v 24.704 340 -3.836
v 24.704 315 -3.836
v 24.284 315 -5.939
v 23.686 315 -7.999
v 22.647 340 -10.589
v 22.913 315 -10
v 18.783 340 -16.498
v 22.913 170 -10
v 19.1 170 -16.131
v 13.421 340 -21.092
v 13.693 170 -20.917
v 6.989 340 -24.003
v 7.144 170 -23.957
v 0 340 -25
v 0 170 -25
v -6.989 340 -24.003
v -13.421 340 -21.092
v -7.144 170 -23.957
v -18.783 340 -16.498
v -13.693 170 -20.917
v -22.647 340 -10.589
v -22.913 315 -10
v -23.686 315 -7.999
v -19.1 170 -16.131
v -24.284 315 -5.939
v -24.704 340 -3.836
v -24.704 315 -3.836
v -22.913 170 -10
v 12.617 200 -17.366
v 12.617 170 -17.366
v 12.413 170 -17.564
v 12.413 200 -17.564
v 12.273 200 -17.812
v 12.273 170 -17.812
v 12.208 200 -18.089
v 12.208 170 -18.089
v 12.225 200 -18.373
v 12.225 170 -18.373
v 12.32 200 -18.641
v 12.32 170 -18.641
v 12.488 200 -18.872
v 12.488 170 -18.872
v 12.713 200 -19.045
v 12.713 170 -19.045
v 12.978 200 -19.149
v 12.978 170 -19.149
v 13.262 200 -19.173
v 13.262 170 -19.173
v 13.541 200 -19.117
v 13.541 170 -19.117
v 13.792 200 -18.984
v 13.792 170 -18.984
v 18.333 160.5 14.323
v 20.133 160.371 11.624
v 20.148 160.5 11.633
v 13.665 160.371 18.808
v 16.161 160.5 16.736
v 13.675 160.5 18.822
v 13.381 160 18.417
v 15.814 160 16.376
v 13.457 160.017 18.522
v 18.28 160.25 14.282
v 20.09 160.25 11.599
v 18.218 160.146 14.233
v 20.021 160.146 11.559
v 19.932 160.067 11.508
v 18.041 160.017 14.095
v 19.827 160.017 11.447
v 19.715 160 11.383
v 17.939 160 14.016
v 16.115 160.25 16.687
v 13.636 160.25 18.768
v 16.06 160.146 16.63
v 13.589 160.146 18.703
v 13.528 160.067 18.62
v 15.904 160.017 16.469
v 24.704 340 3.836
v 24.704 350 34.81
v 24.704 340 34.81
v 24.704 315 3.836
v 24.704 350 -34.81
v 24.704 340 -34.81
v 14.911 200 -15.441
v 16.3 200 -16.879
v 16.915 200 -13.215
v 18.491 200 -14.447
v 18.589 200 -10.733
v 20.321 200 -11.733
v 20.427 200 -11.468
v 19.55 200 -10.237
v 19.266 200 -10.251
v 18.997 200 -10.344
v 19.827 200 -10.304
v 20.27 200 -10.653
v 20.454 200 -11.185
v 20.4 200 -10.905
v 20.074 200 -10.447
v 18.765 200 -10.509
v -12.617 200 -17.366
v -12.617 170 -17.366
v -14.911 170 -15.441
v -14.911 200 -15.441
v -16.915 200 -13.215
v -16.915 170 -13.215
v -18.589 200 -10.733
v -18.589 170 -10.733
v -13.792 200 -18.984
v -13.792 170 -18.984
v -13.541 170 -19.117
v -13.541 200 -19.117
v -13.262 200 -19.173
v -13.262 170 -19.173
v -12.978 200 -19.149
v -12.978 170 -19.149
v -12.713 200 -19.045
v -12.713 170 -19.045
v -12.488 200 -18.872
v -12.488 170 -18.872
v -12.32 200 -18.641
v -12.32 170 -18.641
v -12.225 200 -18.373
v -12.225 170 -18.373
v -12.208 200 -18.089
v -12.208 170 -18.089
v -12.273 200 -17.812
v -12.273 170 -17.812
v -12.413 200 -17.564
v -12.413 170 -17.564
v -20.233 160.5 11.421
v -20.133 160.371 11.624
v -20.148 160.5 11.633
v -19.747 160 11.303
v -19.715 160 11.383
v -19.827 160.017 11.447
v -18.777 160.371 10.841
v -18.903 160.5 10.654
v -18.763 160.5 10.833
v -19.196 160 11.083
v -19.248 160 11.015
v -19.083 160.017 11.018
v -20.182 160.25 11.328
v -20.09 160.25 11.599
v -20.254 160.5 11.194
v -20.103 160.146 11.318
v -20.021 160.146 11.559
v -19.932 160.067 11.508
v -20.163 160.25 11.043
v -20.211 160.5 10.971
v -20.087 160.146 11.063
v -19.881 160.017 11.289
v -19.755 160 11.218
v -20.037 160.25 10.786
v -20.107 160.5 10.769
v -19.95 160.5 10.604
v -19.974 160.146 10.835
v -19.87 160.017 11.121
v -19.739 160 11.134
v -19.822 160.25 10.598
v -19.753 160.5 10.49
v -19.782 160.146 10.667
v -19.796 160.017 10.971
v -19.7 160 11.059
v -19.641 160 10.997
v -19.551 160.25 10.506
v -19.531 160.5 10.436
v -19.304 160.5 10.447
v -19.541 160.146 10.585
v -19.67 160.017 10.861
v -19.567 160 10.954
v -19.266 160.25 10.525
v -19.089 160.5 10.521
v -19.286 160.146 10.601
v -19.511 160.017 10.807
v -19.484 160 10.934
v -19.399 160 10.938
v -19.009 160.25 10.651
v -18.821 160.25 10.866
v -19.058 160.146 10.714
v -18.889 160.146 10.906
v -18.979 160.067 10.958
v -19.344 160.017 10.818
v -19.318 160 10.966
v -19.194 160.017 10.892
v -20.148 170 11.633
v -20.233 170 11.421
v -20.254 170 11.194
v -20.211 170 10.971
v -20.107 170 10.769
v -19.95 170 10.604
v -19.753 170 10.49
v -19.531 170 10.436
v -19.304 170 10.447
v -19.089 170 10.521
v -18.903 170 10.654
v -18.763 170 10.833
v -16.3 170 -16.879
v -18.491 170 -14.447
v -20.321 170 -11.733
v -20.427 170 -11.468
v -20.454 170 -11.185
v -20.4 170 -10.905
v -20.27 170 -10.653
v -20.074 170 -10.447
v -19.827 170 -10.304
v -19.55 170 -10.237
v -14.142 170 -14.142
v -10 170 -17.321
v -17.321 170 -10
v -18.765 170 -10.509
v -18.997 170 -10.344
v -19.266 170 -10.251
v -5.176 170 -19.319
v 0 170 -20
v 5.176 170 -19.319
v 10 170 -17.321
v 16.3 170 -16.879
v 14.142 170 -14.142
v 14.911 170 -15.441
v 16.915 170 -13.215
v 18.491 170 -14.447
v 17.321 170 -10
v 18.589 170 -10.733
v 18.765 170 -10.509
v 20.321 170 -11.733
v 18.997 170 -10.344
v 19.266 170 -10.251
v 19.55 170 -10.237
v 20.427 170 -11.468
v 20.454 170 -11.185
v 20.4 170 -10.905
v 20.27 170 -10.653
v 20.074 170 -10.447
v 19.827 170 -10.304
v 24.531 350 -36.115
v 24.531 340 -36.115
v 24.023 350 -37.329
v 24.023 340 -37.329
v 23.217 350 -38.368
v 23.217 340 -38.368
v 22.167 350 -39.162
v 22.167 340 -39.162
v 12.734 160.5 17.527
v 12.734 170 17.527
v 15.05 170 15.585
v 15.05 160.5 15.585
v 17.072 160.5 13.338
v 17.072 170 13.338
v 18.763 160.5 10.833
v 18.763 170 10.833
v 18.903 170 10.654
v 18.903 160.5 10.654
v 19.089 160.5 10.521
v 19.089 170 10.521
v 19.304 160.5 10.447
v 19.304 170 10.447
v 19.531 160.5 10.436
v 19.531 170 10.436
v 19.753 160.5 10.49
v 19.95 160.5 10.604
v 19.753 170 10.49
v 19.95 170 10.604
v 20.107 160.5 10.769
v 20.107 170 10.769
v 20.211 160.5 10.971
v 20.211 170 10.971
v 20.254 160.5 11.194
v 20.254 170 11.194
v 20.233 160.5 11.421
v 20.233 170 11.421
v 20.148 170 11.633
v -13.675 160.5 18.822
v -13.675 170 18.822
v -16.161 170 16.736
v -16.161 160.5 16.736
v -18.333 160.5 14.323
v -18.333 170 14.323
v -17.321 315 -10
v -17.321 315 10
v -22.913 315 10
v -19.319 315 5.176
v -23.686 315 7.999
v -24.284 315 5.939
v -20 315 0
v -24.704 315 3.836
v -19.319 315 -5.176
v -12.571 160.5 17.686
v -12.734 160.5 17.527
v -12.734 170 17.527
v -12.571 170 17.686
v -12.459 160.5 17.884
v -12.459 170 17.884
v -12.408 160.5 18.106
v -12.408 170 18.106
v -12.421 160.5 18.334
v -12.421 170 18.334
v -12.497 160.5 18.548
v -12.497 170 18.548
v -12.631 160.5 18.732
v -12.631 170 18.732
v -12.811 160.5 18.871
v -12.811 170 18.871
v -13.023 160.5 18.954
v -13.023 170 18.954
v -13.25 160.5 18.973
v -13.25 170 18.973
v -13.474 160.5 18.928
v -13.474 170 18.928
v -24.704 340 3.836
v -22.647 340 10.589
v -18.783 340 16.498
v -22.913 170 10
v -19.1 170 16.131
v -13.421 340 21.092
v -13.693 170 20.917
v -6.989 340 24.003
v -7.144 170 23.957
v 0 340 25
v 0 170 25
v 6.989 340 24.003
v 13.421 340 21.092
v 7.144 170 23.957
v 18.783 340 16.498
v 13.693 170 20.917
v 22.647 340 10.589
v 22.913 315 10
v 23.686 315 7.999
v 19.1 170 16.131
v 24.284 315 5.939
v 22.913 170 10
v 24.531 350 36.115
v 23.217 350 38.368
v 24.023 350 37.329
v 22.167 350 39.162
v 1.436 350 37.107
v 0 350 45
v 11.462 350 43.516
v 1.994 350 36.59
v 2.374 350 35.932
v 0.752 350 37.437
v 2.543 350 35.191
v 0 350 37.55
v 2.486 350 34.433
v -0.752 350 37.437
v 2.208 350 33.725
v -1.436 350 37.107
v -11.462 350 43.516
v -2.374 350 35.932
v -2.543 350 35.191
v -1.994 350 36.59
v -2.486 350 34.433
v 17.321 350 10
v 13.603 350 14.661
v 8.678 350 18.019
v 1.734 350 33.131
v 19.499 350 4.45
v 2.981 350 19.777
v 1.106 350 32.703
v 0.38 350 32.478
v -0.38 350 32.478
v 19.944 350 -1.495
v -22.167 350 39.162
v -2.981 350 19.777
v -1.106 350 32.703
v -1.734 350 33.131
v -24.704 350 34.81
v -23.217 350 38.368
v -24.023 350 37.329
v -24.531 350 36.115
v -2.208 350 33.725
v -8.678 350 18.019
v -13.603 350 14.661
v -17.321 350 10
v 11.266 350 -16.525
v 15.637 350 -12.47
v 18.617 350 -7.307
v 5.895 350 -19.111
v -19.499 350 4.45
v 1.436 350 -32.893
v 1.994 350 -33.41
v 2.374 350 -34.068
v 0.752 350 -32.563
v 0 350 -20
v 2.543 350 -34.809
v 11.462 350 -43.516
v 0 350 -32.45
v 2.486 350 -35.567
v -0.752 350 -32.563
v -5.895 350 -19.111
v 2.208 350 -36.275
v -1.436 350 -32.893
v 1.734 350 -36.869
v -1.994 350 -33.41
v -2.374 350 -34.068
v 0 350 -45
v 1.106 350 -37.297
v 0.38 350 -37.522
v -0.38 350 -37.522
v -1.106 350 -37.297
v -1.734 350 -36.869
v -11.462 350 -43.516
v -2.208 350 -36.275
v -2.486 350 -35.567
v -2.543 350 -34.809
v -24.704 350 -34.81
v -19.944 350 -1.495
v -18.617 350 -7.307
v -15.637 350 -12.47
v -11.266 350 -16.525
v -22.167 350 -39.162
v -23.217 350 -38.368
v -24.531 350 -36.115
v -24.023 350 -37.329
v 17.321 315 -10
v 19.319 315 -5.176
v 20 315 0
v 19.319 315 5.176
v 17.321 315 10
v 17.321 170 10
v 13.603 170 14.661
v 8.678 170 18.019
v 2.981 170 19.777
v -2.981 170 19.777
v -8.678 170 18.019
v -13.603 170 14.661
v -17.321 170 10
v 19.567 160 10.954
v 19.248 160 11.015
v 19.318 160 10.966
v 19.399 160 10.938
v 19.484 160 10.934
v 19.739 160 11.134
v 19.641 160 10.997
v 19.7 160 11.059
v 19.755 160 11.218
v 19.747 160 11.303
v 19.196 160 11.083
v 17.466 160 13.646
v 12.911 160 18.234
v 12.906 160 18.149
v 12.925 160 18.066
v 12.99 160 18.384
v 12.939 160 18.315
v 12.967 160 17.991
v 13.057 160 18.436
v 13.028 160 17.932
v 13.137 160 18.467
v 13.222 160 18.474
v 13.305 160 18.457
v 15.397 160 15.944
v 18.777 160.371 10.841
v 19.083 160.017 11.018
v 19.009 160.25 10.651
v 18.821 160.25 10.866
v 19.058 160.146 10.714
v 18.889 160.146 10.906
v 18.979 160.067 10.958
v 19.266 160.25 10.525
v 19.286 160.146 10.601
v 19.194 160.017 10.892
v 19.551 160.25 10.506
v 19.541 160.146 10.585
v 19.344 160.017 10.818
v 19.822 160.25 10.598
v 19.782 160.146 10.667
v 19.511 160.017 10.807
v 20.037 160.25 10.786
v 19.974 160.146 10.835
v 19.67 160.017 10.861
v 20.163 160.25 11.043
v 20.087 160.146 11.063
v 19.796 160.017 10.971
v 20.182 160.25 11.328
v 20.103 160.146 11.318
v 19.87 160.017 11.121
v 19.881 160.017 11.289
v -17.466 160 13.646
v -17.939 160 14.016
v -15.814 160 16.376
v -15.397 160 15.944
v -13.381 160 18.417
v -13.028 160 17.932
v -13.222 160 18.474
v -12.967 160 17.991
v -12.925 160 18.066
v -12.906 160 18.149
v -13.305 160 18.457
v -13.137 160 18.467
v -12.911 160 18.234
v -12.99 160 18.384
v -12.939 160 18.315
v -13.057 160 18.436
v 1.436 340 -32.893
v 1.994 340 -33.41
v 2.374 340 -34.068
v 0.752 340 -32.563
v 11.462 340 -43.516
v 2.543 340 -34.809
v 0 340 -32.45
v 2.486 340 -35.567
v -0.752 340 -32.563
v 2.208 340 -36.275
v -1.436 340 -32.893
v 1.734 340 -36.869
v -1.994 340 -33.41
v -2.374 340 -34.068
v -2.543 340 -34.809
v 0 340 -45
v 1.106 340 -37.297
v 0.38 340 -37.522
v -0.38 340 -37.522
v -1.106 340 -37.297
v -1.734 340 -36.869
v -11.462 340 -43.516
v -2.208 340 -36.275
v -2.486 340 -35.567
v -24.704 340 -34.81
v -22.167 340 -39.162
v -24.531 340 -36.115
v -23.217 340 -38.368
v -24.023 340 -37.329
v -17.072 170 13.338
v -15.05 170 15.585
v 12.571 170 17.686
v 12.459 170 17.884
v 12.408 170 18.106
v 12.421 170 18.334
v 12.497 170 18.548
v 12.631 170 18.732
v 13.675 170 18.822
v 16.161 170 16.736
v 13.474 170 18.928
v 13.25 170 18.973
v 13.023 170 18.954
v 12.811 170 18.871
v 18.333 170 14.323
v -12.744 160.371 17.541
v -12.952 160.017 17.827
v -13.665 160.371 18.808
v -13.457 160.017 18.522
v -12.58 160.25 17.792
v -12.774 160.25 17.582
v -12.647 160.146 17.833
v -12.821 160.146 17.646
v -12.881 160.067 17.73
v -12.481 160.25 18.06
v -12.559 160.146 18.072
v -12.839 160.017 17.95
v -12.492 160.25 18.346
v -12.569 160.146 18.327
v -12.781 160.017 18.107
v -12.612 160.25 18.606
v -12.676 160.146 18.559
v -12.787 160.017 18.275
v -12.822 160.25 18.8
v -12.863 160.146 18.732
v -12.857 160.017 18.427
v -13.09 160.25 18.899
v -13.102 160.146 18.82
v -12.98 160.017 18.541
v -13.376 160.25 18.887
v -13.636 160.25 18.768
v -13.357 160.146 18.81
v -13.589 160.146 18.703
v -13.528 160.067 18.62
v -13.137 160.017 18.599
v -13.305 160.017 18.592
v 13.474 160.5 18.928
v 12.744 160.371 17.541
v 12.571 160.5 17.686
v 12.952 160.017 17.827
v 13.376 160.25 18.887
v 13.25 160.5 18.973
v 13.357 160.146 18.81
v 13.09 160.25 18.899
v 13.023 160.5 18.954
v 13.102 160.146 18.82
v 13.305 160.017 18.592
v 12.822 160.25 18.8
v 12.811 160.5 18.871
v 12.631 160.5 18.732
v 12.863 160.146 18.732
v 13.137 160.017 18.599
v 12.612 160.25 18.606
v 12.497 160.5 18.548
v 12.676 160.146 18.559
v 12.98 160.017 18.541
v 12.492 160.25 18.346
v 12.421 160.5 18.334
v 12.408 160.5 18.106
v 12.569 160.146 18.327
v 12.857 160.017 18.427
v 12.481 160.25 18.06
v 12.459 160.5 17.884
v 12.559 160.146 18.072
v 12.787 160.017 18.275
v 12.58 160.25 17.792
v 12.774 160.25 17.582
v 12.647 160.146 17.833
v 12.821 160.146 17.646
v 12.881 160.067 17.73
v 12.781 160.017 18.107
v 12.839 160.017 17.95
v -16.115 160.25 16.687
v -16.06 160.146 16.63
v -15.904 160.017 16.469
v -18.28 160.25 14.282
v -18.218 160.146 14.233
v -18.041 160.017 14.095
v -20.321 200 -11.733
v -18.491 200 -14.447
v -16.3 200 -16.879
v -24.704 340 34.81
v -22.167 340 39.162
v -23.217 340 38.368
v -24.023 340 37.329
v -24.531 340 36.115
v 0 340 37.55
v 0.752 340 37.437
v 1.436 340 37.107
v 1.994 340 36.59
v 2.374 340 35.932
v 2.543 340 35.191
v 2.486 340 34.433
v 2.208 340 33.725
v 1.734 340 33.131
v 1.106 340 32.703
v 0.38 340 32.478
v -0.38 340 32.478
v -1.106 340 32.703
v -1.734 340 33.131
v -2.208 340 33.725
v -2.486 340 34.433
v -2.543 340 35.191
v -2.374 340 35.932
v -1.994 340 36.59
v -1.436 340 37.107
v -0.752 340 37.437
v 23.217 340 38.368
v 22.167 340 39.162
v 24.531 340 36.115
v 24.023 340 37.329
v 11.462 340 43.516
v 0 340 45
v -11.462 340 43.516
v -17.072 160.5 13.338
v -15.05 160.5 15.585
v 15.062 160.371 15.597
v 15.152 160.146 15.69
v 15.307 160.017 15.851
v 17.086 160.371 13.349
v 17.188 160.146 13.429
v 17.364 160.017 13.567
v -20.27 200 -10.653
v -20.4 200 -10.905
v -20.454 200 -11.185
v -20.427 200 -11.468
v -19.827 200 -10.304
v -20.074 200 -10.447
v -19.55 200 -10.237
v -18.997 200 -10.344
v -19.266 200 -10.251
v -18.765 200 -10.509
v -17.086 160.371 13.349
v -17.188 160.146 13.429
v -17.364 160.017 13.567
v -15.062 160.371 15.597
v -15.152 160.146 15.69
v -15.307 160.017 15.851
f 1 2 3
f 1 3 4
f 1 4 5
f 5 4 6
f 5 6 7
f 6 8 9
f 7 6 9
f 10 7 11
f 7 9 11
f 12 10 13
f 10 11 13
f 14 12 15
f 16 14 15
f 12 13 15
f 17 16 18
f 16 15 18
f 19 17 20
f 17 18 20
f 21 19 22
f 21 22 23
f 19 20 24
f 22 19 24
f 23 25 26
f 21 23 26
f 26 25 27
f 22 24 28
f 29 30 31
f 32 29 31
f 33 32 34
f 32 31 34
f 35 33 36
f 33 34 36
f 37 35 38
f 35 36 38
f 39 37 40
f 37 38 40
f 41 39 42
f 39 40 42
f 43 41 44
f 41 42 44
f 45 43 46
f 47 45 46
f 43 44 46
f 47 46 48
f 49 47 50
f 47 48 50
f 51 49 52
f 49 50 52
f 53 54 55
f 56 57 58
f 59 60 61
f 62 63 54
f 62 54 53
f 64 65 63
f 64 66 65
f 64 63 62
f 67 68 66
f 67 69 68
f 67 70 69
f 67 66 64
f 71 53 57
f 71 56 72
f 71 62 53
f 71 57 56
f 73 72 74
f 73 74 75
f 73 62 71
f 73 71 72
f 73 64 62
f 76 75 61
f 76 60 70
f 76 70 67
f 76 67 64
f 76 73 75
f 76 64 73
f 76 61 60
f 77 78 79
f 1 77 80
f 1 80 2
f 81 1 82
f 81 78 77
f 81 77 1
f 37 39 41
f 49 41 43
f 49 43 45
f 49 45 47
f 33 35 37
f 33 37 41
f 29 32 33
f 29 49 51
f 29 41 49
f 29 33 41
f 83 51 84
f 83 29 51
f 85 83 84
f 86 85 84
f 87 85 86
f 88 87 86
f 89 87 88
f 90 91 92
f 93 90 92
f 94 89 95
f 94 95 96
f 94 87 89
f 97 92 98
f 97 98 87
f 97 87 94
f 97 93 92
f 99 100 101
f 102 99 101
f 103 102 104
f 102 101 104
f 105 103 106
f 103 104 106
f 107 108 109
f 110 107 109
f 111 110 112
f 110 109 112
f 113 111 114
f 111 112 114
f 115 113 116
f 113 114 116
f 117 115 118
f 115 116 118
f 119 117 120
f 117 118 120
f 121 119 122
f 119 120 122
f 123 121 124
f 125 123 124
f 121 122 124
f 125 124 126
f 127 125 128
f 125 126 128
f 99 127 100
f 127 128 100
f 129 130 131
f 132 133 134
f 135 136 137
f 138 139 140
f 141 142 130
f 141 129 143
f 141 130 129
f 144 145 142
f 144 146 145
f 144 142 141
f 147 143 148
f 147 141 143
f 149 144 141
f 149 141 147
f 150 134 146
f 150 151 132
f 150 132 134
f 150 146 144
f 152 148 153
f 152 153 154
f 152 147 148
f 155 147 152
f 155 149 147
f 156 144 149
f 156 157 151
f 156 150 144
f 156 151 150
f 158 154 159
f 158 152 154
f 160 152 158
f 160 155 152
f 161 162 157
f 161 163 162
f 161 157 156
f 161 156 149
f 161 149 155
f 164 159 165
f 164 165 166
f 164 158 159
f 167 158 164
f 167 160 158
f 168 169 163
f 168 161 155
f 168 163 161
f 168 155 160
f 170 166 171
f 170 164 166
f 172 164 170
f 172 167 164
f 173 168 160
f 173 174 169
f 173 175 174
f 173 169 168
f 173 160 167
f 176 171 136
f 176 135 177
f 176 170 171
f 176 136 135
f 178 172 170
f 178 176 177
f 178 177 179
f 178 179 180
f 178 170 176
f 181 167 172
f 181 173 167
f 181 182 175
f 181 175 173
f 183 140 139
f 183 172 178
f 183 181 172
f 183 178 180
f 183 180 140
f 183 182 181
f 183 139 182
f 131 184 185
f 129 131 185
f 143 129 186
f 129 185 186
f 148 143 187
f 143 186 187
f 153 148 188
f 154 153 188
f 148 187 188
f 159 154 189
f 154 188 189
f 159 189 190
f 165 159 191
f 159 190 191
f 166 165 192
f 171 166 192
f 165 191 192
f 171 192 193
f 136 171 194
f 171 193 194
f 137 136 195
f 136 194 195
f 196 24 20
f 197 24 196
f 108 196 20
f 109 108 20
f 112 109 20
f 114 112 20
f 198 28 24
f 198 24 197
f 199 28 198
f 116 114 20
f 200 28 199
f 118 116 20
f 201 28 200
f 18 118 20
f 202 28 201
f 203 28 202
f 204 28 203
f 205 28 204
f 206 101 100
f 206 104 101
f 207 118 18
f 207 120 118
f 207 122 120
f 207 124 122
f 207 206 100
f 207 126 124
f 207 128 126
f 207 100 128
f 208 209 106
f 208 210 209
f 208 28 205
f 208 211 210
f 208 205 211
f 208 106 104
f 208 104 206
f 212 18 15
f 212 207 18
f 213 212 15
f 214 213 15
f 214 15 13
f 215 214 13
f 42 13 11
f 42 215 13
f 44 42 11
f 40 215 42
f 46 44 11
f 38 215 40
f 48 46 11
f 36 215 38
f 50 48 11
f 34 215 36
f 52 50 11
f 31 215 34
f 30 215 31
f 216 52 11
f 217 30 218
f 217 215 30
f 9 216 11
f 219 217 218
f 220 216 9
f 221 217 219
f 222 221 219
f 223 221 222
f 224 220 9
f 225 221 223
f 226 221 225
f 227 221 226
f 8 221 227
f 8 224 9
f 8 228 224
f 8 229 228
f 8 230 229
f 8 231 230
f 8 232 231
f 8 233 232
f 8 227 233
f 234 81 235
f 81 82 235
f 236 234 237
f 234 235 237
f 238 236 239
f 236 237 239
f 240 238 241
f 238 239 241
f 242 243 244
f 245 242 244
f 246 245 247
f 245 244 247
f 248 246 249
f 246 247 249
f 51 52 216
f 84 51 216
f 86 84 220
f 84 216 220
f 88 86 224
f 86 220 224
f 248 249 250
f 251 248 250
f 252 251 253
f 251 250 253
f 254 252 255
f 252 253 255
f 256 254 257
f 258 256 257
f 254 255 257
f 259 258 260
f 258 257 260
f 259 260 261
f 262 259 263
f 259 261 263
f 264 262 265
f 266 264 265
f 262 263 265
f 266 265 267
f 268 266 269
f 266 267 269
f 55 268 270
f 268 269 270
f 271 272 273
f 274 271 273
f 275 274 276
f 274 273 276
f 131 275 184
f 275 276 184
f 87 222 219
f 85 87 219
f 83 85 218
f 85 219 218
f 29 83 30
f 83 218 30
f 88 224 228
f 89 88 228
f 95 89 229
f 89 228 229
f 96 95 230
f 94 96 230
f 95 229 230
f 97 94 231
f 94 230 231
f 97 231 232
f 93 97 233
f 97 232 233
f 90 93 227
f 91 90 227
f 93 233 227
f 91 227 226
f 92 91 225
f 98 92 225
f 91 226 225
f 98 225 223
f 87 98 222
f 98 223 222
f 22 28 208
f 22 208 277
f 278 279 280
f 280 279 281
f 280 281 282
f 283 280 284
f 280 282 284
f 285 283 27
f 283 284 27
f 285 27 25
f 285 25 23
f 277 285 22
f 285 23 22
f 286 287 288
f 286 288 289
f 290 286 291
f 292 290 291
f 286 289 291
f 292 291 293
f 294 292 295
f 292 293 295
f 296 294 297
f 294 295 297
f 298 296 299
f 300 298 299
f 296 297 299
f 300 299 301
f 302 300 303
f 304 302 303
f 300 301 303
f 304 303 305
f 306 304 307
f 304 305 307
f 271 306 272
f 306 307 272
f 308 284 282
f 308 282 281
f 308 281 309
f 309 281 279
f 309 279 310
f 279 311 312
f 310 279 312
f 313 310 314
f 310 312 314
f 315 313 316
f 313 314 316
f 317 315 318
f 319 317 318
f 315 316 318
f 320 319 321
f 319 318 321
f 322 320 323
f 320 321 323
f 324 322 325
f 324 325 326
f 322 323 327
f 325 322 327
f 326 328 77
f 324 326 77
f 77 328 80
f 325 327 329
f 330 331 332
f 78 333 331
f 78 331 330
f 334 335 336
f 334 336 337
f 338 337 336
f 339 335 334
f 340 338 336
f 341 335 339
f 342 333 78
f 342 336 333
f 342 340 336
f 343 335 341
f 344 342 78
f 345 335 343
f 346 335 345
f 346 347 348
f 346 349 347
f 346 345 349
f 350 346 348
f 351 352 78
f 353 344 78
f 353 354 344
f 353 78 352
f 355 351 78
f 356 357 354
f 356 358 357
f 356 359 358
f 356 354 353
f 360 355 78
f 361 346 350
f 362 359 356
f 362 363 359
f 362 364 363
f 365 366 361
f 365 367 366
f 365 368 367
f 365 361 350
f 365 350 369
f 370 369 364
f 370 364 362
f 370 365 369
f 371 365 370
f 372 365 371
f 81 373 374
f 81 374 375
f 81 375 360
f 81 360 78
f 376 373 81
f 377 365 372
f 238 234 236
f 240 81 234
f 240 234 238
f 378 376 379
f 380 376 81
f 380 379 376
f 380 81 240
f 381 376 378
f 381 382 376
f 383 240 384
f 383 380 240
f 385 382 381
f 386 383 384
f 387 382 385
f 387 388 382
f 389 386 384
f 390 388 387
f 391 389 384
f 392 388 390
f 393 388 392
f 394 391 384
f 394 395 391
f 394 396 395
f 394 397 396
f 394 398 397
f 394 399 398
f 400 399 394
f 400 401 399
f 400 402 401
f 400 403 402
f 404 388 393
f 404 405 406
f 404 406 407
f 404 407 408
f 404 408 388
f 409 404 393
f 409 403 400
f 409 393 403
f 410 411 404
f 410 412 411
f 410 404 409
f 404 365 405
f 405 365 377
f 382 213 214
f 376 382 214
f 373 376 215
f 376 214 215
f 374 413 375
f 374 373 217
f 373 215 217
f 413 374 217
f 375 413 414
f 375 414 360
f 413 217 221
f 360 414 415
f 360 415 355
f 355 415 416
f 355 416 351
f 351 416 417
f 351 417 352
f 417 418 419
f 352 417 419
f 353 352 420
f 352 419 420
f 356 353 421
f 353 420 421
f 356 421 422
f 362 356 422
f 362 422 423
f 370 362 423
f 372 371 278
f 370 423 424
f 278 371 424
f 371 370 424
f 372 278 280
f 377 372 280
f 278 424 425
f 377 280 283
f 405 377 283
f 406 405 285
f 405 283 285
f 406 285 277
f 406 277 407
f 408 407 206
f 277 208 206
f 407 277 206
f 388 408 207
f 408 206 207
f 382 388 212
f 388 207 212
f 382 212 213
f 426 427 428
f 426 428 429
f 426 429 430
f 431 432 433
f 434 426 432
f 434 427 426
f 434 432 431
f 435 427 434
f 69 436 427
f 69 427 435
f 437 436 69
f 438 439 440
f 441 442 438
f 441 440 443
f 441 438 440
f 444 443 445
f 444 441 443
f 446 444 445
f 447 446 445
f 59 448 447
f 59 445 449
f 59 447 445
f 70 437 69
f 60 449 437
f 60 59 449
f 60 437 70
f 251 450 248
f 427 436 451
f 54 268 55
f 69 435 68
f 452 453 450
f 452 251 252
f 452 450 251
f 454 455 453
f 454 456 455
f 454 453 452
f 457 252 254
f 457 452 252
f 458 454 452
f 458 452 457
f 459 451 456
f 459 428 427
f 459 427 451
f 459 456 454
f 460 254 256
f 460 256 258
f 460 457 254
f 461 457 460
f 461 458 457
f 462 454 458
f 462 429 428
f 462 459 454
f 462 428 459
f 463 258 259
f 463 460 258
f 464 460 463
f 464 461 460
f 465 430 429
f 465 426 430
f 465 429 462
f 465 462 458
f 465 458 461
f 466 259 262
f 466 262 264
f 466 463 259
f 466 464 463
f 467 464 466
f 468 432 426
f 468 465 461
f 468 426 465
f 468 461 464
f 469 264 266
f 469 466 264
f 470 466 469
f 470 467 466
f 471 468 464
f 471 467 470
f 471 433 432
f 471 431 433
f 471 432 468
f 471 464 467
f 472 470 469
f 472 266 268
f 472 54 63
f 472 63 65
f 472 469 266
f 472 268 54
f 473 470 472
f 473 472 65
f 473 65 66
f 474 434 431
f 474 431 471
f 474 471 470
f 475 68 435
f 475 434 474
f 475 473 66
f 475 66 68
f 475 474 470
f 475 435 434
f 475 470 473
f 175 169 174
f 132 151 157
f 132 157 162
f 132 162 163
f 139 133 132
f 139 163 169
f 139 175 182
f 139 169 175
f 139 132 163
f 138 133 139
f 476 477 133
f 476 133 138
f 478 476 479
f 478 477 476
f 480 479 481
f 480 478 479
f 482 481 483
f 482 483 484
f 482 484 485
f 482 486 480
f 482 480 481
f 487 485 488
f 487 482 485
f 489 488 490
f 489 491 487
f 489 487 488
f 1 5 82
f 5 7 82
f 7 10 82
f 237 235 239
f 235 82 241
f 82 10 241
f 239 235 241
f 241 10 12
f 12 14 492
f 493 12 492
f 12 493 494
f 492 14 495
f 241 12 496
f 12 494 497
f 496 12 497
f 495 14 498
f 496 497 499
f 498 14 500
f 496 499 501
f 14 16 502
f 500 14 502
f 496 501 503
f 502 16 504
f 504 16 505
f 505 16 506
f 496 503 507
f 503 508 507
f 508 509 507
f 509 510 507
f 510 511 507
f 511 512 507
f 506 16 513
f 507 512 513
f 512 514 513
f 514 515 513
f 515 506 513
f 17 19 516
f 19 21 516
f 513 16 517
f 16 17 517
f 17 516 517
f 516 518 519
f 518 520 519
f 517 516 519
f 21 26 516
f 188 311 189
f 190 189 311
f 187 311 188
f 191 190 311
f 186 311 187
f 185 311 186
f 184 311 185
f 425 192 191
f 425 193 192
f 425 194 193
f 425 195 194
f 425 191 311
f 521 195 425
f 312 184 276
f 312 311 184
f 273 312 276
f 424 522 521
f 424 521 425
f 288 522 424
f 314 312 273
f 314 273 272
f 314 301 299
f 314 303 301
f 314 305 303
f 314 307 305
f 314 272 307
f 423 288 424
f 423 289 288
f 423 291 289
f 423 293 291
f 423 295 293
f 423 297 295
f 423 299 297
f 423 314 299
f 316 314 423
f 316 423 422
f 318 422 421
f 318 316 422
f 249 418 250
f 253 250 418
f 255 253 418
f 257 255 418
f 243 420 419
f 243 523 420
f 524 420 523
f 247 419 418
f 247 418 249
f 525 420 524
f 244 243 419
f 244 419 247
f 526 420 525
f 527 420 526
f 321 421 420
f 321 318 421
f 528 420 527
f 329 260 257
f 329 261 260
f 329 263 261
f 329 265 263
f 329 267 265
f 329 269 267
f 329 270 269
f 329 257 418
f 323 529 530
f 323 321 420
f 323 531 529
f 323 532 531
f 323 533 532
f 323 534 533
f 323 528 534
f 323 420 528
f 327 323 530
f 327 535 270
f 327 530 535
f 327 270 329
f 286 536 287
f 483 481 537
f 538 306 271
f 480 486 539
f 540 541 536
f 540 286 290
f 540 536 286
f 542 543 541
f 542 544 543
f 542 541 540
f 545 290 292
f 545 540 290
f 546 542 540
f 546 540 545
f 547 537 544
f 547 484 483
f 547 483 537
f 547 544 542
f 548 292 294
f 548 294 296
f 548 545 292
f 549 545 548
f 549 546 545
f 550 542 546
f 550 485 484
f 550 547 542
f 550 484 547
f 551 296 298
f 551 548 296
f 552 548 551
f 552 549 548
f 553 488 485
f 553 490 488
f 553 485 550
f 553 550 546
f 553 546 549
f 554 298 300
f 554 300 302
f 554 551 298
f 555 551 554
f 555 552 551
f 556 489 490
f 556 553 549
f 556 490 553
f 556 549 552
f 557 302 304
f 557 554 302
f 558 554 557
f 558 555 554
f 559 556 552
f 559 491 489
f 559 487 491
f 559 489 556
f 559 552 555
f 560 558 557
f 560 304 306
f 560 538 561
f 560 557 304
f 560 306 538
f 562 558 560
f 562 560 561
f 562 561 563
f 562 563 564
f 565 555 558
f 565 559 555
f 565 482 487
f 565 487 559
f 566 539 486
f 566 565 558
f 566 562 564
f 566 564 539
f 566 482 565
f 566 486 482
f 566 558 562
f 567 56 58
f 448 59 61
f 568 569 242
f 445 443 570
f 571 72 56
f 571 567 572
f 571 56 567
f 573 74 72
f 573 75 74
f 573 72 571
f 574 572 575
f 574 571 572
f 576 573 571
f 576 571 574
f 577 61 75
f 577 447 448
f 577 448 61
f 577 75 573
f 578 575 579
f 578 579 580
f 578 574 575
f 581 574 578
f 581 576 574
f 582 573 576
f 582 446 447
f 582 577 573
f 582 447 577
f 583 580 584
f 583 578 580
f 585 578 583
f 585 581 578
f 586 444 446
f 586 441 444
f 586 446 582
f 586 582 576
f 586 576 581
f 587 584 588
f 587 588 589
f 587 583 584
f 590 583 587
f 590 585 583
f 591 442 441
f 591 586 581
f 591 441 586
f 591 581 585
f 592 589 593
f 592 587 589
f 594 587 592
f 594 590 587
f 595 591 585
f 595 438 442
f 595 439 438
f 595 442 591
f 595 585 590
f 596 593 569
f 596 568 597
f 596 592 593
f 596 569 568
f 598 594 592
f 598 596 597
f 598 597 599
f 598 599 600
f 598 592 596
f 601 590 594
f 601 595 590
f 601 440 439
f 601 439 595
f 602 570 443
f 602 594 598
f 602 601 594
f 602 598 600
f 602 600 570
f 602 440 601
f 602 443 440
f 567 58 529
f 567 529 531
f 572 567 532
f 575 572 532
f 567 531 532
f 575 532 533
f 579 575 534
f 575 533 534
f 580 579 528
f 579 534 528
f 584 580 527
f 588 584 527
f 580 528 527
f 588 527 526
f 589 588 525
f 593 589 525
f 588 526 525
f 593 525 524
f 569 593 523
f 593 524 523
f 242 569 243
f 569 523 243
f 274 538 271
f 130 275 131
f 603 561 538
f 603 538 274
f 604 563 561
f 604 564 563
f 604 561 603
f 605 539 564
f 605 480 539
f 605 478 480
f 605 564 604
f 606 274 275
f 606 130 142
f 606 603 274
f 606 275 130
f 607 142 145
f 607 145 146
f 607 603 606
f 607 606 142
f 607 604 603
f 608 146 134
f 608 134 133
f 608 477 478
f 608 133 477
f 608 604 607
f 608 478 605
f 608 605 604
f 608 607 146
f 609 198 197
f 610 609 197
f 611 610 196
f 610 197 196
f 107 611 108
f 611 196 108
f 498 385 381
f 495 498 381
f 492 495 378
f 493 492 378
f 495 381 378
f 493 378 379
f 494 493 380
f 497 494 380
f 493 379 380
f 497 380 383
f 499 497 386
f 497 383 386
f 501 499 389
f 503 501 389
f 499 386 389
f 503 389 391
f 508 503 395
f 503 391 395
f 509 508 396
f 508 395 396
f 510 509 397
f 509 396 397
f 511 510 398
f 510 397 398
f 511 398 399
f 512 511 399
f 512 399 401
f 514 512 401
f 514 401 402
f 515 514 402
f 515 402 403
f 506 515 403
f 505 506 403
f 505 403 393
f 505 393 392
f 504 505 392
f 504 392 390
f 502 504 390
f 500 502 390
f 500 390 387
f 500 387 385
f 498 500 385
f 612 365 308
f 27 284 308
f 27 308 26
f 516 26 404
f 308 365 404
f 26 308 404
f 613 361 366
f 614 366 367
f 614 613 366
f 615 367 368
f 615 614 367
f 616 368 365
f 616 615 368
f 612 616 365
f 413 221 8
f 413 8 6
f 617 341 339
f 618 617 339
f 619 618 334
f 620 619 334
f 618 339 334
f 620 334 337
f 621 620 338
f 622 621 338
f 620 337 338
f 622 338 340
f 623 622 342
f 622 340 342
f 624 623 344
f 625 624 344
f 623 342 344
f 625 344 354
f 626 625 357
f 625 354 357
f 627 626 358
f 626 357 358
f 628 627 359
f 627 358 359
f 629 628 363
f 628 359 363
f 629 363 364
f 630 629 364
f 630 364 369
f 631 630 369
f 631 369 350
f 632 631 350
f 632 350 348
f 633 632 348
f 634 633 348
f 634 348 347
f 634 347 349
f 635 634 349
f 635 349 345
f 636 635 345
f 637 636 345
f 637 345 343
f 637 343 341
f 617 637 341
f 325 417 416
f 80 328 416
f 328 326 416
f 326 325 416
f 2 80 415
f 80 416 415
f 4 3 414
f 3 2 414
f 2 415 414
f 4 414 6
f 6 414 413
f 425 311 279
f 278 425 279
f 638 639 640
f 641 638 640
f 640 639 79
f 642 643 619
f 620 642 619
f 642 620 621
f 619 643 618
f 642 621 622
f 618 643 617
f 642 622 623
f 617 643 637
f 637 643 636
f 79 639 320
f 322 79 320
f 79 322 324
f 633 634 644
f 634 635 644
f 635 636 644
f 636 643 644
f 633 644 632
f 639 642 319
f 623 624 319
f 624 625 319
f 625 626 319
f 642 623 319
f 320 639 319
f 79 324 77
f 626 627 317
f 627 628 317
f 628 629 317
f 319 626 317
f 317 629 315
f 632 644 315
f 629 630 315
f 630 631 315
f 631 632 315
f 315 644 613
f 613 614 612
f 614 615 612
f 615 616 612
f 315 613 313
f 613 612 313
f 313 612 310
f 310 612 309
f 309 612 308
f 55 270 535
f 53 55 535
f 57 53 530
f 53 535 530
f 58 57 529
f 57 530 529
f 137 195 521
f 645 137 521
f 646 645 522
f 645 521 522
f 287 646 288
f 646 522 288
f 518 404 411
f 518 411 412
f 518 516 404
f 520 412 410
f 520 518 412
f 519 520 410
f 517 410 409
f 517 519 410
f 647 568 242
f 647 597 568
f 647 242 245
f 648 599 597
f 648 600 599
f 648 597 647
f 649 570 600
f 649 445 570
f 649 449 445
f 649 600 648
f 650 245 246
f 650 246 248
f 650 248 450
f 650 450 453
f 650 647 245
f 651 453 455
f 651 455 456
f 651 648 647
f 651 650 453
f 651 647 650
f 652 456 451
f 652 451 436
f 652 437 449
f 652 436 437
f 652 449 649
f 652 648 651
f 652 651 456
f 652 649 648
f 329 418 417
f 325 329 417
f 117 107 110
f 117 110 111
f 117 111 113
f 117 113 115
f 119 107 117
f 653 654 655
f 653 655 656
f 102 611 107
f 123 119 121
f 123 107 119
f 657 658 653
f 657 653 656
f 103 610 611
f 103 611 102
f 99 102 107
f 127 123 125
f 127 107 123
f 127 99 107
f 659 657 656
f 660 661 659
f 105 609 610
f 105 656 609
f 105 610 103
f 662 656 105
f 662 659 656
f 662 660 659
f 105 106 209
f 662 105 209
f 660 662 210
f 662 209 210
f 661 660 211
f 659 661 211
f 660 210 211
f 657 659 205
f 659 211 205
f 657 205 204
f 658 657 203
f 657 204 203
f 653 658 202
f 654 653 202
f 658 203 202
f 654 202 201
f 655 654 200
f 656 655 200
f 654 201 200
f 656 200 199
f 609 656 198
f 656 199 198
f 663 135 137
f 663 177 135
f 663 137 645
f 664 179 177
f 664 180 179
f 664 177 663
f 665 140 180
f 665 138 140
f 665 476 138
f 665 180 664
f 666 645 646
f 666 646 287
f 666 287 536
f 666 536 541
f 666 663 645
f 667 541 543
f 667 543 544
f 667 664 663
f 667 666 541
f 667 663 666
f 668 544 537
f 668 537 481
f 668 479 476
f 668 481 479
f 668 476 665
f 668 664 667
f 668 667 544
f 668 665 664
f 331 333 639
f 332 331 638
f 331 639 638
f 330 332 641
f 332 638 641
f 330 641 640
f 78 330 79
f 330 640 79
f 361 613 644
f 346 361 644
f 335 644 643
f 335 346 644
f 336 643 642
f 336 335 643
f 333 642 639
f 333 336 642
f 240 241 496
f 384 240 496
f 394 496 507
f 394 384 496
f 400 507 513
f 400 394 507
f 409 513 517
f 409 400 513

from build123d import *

# Parameters (mm, degrees)
SKETCH_3_R          = 25
EXTRUDE_1_DEPTH     = 340
SKETCH_6_R          = 45
EXTRUDE_2_DEPTH     = 10
EXTRUDE_START       = 10
SKETCH_7_R          = 45
EXTRUDE_3_DEPTH     = 10
SKETCH_4_R          = 20
CUT_EXTRUDE_1_DEPTH = 366.581728209
SKETCH_8_W          = 40.591982286
SKETCH_8_H          = 75.225313462
CUT_EXTRUDE_2_DEPTH = 366.581728209
SKETCH_9_W          = 20
SKETCH_9_H          = 290
CUT_EXTRUDE_3_DEPTH = 357.405667744
M6X1_0_1_D          = 5
FILLET_1_R          = 5
SKETCH_12_R         = 2.55
CUT_EXTRUDE_4_DEPTH = 364.641702853
SKETCH_13_W         = 245.746793121
SKETCH_13_H         = 335.021693113
CUT_EXTRUDE_5_DEPTH = 180
CUT_EXTRUDE_7_DEPTH = 30
EXTRUDE_4_DEPTH     = 10
FILLET_5_R          = 0.5
FILLET_6_R          = 0.5


with BuildPart() as part:
    # 草图3 → 凸台-拉伸1 (new body)
    with BuildSketch(Plane(origin=(0, 0, 0), x_dir=(1, 0, 0), z_dir=(0, 1, 0))):
        with Locations(Location((0, 0, 0), (0, 0, 270))):
            Circle(SKETCH_3_R)
    extrude(amount=EXTRUDE_1_DEPTH)

    # 草图6 → 凸台-拉伸2 (add)
    with BuildSketch(Plane.XZ):
        with Locations(Location((0, 0, 0), (0, 0, 270))):
            Circle(SKETCH_6_R)
    extrude(amount=EXTRUDE_2_DEPTH)

    # 草图7 → 凸台-拉伸3 (add)
    with BuildSketch(Plane(origin=(0, 340, 0), x_dir=(1, 0, 0), z_dir=(0, 1, 0)).offset(EXTRUDE_START)):
        with Locations(Location((0, 0, 0), (0, 0, 90))):
            Circle(SKETCH_7_R)
    extrude(amount=-EXTRUDE_3_DEPTH)

    # 草图4 → 切除-拉伸1 (cut, through all)
    with BuildSketch(Plane.XZ.offset(10)):
        with Locations(Location((0, 0, 0), (0, 0, 270))):
            Circle(SKETCH_4_R)
    extrude(amount=-CUT_EXTRUDE_1_DEPTH, mode=Mode.SUBTRACT)

    # 草图8 → 切除-拉伸2 (cut, through all)
    with BuildSketch(Plane(origin=(0, 350, 0), x_dir=(1, 0, 0), z_dir=(0, 1, 0))):
        with Locations((45, 0)):
            Rectangle(SKETCH_8_W, SKETCH_8_H)
    cut_extrude_2 = extrude(amount=-CUT_EXTRUDE_2_DEPTH, mode=Mode.SUBTRACT)

    # 草图9 → 切除-拉伸3 (cut, through all)
    with BuildSketch(Plane(origin=(-25.295991143, 0, 0), x_dir=(0, 0, -1), z_dir=(1, 0, 0))):
        with Locations((0, 170)):
            Rectangle(SKETCH_9_W, SKETCH_9_H)
    extrude(amount=CUT_EXTRUDE_3_DEPTH, mode=Mode.SUBTRACT)

    # M6x1.0 螺纹孔1 (through all)
    with Locations(Plane(origin=(0, 350, 0), x_dir=(1, 0, 0), z_dir=(0, 1, 0))):
        with Locations((0, -35), (0, 35)):
            Hole(M6X1_0_1_D / 2)

    # 镜向1: 切除-拉伸2 across plane
    add(cut_extrude_2.mirror(Plane(origin=(0, 0, 0), x_dir=(0, 0, 1), z_dir=(1, 0, 0))), mode=Mode.SUBTRACT)

    # 圆角1
    fillet_1_edges = [part.edges().sort_by_distance(p)[0] for p in [
        (-24.704008857, -5, -37.612656731),
        (-24.704008857, 345, -37.612656731),
        (-24.704008857, -5, 37.612656731),
        (-24.704008857, 345, 37.612656731),
        (24.704008857, -5, 37.612656731),
        (24.704008857, 345, 37.612656731),
        (24.704008857, -5, -37.612656731),
        (24.704008857, 345, -37.612656731),
    ]]
    fillet(fillet_1_edges, radius=FILLET_1_R)

    # 草图12 → 切除-拉伸4 (cut, through all)
    with BuildSketch(Plane(origin=(0, 350, 0), x_dir=(1, 0, 0), z_dir=(0, 1, 0))):
        with Locations(Location((0, 35, 0), (0, 0, 270))):
            Circle(SKETCH_12_R)
        with Locations(Location((0, -35, 0), (0, 0, 270))):
            Circle(SKETCH_12_R)
    extrude(amount=-CUT_EXTRUDE_4_DEPTH, mode=Mode.SUBTRACT)

    # 草图13 → 切除-拉伸5 (cut)
    with BuildSketch(Plane.XZ.offset(10)):
        with Locations((-21.384575648, -11.685004811)):
            Rectangle(SKETCH_13_W, SKETCH_13_H)
    extrude(amount=-CUT_EXTRUDE_5_DEPTH, mode=Mode.SUBTRACT)

    # 草图16 → 切除-拉伸7 (cut)
    with BuildSketch(Plane.XZ.offset(-170)):
        with BuildLine():
            ThreePointArc((-20.321384852, -11.732557014), (-17.43797807, -15.701225978), (-13.79244797, -18.983676024))
            ThreePointArc((-13.79244797, -18.983676024), (-12.395645723, -18.762444282), (-12.616877465, -17.365642036))
            ThreePointArc((-12.616877465, -17.365642036), (-15.951688419, -14.362964766), (-18.589334044, -10.732557014))
            ThreePointArc((-18.589334044, -10.732557014), (-19.955359448, -10.366531611), (-20.321384852, -11.732557014))
        make_face()
        with BuildLine():
            ThreePointArc((13.79244797, -18.983676024), (17.43797807, -15.701225978), (20.321384852, -11.732557014))
            ThreePointArc((20.321384852, -11.732557014), (19.955359448, -10.366531611), (18.589334044, -10.732557014))
            ThreePointArc((18.589334044, -10.732557014), (15.951688419, -14.362964766), (12.616877465, -17.365642036))
            ThreePointArc((12.616877465, -17.365642036), (12.395645723, -18.762444282), (13.79244797, -18.983676024))
        make_face()
    extrude(amount=-CUT_EXTRUDE_7_DEPTH, mode=Mode.SUBTRACT)

    # 草图17 → 凸台-拉伸4 (add)
    with BuildSketch(Plane.XZ.offset(-170)):
        with BuildLine():
            ThreePointArc((20.148179771, 11.632557014), (17.289349105, 15.567399857), (13.674890919, 18.821872625))
            ThreePointArc((13.674890919, 18.821872625), (12.557449122, 18.644887232), (12.734434515, 17.527445434))
            ThreePointArc((12.734434515, 17.527445434), (16.100317384, 14.496790887), (18.762539125, 10.832557014))
            ThreePointArc((18.762539125, 10.832557014), (19.855359448, 10.539736691), (20.148179771, 11.632557014))
        make_face()
        with BuildLine():
            ThreePointArc((-13.674890919, 18.821872625), (-17.289349105, 15.567399857), (-20.148179771, 11.632557014))
            ThreePointArc((-20.148179771, 11.632557014), (-19.855359448, 10.539736691), (-18.762539125, 10.832557014))
            ThreePointArc((-18.762539125, 10.832557014), (-16.100317384, 14.496790887), (-12.734434515, 17.527445434))
            ThreePointArc((-12.734434515, 17.527445434), (-12.557449122, 18.644887232), (-13.674890919, 18.821872625))
        make_face()
    extrude(amount=EXTRUDE_4_DEPTH)

    # 圆角5
    fillet_5_edges = [part.edges().sort_by_distance(p)[0] for p in [
        (-12.557449122, 160, 18.644887232),
        (-17.289349105, 160, 15.567399857),
        (-19.855359448, 160, 10.539736691),
        (-16.100317384, 160, 14.496790887),
    ]]
    fillet(fillet_5_edges, radius=FILLET_5_R)

    # 圆角6
    fillet_6_edges = [part.edges().sort_by_distance(p)[0] for p in [
        (19.855359448, 160, 10.539736691),
        (17.289349105, 160, 15.567399857),
        (12.557449122, 160, 18.644887232),
        (16.100317384, 160, 14.496790887),
    ]]
    fillet(fillet_6_edges, radius=FILLET_6_R)


solid = part.part
